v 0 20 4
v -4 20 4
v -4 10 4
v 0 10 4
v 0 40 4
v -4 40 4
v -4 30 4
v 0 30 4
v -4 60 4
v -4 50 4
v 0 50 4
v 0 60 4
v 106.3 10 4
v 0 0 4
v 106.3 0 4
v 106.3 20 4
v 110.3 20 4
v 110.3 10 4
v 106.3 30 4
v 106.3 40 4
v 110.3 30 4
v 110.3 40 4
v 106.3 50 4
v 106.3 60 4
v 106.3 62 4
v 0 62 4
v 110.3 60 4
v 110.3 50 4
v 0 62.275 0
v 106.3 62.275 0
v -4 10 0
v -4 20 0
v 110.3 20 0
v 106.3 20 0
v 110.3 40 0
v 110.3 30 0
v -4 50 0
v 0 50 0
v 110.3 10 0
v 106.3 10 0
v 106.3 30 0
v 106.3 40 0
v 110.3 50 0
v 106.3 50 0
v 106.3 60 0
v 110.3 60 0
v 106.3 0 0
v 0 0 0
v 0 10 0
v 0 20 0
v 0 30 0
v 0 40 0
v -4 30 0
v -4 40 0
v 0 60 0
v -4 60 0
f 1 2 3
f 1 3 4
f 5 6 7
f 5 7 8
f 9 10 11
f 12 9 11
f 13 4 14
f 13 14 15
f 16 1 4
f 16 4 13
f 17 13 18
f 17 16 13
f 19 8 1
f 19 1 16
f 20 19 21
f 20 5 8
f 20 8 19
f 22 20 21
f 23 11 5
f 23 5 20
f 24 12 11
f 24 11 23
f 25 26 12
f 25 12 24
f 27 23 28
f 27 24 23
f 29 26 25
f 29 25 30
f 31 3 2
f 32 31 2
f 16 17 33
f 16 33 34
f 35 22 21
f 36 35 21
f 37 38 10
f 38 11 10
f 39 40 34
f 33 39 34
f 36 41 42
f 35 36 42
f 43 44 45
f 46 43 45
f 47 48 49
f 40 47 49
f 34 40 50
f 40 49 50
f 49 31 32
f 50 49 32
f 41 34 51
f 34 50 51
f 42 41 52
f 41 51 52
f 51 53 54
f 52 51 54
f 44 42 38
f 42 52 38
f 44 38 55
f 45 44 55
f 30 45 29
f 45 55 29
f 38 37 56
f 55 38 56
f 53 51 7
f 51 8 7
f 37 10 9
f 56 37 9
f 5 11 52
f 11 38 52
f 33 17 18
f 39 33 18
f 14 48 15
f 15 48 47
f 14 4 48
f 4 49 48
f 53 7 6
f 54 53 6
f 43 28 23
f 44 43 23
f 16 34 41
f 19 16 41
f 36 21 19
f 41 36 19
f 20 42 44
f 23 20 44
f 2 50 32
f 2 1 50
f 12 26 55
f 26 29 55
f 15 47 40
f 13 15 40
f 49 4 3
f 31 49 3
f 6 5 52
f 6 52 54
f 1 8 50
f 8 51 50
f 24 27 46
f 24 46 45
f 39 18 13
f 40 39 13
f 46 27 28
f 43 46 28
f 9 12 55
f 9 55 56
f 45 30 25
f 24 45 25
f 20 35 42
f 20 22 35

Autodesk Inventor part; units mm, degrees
ref_plane "YZ Plane" through (0, 0, 0) normal (1, 0, 0) x (0, 1, 0)
ref_plane "XZ Plane" through (0, 0, 0) normal (0, 1, 0) x (-1, 0, 0)
ref_plane "XY Plane" through (0, 0, 0) normal (0, 0, 1) x (1, 0, 0)
sketch "Эскиз1" plane through (0, 0, 0) normal (0, 0, 1) x (1, 0, 0)
  line L0 (0, 0) -> (106.3, 0)
  line L1 (106.3, 0) -> (106.3, 62)
  line L2 (106.3, 62) -> (0, 62)
  line L3 (0, 62) -> (0, 0)
  dimension "d0" = 106.3
  dimension "d1" = 62
extrude "Выдавливание1" add sketch "Эскиз1" along normal blind 4
sketch "Эскиз2" plane through (0, 0, 4) normal (0, 0, 1) x (1, 0, 0)
  line L0 (106.3, 10) -> (106.3, 20) projected
  line L1 (110.3, 10) -> (106.3, 10) projected
  line L2 (110.3, 20) -> (110.3, 10) projected
  line L3 (110.3, 20) -> (106.3, 20) projected
  line L4 (106.3, 30) -> (106.3, 40) projected
  line L5 (110.3, 30) -> (106.3, 30) projected
  line L6 (110.3, 40) -> (110.3, 30) projected
  line L7 (110.3, 40) -> (106.3, 40) projected
  line L8 (106.3, 50) -> (106.3, 60) projected
  line L9 (110.3, 50) -> (106.3, 50) projected
  line L10 (110.3, 60) -> (110.3, 50) projected
  line L11 (110.3, 60) -> (106.3, 60) projected
  line L12 (-4, 10) -> (-4, 20) projected
  line L13 (0, 10) -> (-4, 10) projected
  line L14 (0, 20) -> (0, 10) projected
  line L15 (0, 20) -> (-4, 20) projected
  line L16 (-4, 30) -> (-4, 40) projected
  line L17 (0, 30) -> (-4, 30) projected
  line L18 (0, 40) -> (0, 30) projected
  line L19 (0, 40) -> (-4, 40) projected
  line L20 (-4, 50) -> (-4, 60) projected
  line L21 (0, 50) -> (-4, 50) projected
  line L22 (0, 60) -> (0, 50) projected
  line L23 (0, 60) -> (-4, 60) projected
  point P0 (0, 0)
extrude "Выдавливание2" add sketch "Эскиз2" against normal up to surface (4 mm away)
sketch "Эскиз3" plane through (-4, 50, 4) normal (-1, 0, 0) x (0, 0, 1)
  line L0 (-4, 10) -> (0, 10) projected
  line L1 (0, 10) -> (0, 16) projected
  line L2 (0, 16) -> (-10, 16.6879) projected
  line L3 (-10, 16.6879) -> (-10, 12.6879) projected
  line L4 (-10, 12.6879) -> (-20, 13.3759) projected
  line L5 (-20, 13.3759) -> (-20, 17.3759) projected
  line L6 (-20, 17.3759) -> (-30, 18.0638) projected
  line L7 (-30, 18.0638) -> (-30, 14.0638) projected
  line L8 (-30, 14.0638) -> (-40, 14.7517) projected
  line L9 (-40, 14.7517) -> (-40, 18.7517) projected
  line L10 (-40, 18.7517) -> (-50, 19.4397) projected
  line L11 (-50, 19.4397) -> (-50, 15.4397) projected
  line L12 (-50, 15.4397) -> (-60, 16.1276) projected
  line L13 (-60, 16.1276) -> (-60, 20.1276) projected
  line L14 (-60, 20.1276) -> (-70, 20.8155) projected
  line L15 (-70, 20.8155) -> (-70, 16.8155) projected
  line L16 (-70, 16.8155) -> (-80, 17.5035) projected
  line L17 (-80, 17.5035) -> (-80, 21.5035) projected
  line L18 (-80, 21.5035) -> (-90, 22.1914) projected
  line L19 (-90, 22.1914) -> (-90, 18.1914) projected
  line L20 (-90, 18.1914) -> (-100, 18.8794) projected
  line L21 (-100, 18.8794) -> (-100, 22.8794) projected
  line L22 (-100, 22.8794) -> (-110, 23.5673) projected
  line L23 (-110, 23.5673) -> (-110, 19.5673) projected
  line L24 (-110, 19.5673) -> (-120, 20.2552) projected
  line L25 (-120, 20.2552) -> (-120, 24.2552) projected
  line L26 (-120, 24.2552) -> (-130, 24.9432) projected
  line L27 (-130, 24.9432) -> (-130, 20.9432) projected
  line L28 (-130, 20.9432) -> (-140, 21.6311) projected
  line L29 (-140, 21.6311) -> (-140, 25.6311) projected
  line L30 (-140, 25.6311) -> (-145.3625, 26) projected
  line L31 (-145.3625, 26) -> (-145.3625, 16) projected
  line L32 (-145.3625, 16) -> (-208, -30) projected
  line L33 (-208, -50) -> (-208, -30) projected
  line L34 (-187, -50) -> (-208, -50) projected
  line L35 (-187, -54) -> (-187, -50) projected
  line L36 (-177, -54) -> (-187, -54) projected
  line L37 (-177, -50) -> (-177, -54) projected
  line L38 (-167, -50) -> (-177, -50) projected
  line L39 (-167, -54) -> (-167, -50) projected
  line L40 (-157, -54) -> (-167, -54) projected
  line L41 (-157, -50) -> (-157, -54) projected
  line L42 (-147, -50) -> (-157, -50) projected
  line L43 (-147, -54) -> (-147, -50) projected
  line L44 (-137, -54) -> (-147, -54) projected
  line L45 (-137, -50) -> (-137, -54) projected
  line L46 (-127, -50) -> (-137, -50) projected
  line L47 (-127, -54) -> (-127, -50) projected
  line L48 (-117, -54) -> (-127, -54) projected
  line L49 (-117, -50) -> (-117, -54) projected
  line L50 (-107, -50) -> (-117, -50) projected
  line L51 (-107, -54) -> (-107, -50) projected
  line L52 (-97, -54) -> (-107, -54) projected
  line L53 (-97, -50) -> (-97, -54) projected
  line L54 (-87, -50) -> (-97, -50) projected
  line L55 (-87, -54) -> (-87, -50) projected
  line L56 (-77, -54) -> (-87, -54) projected
  line L57 (-77, -50) -> (-77, -54) projected
  line L58 (-67, -50) -> (-77, -50) projected
  line L59 (-67, -54) -> (-67, -50) projected
  line L60 (-57, -54) -> (-67, -54) projected
  line L61 (-57, -50) -> (-57, -54) projected
  line L62 (-47, -50) -> (-57, -50) projected
  line L63 (-47, -54) -> (-47, -50) projected
  line L64 (-37, -54) -> (-47, -54) projected
  line L65 (-37, -50) -> (-37, -54) projected
  line L66 (-27, -50) -> (-37, -50) projected
  line L67 (-27, -54) -> (-27, -50) projected
  line L68 (-17, -54) -> (-27, -54) projected
  line L69 (-17, -50) -> (-17, -54) projected
  line L70 (-17, -50) -> (0, -50) projected
  line L71 (0, -50) -> (0, -40) projected
  line L72 (0, -40) -> (-4, -40) projected
  line L73 (-4, -40) -> (-4, -30) projected
  line L74 (-4, -30) -> (0, -30) projected
  line L75 (0, -30) -> (0, -20) projected
  line L76 (0, -20) -> (-4, -20) projected
  line L77 (-4, -20) -> (-4, -10) projected
  line L78 (-4, -10) -> (0, -10) projected
  line L79 (0, -10) -> (0, 0) projected
  line L80 (0, 0) -> (-4, 0) projected
  line L81 (-4, 0) -> (-4, 10) projected
  line L82 (-4, 12) -> (0, 12) projected
  line L83 (0, 12) -> (-10, 12.6879) projected
  line L84 (-4, 12) -> (-4, 13.5119)
  point P0 (-4, -50)
  point P1 (-4, 12.2752)
extrude "Выдавливание3" add sketch "Эскиз3" against normal up to surface (110.3 mm away) contours L82 L84 L83
sketch "Эскиз4" plane through (-4, 50, 4) normal (-1, 0, 0) x (0, 0, 1)
  line L0 (-4, 12) -> (0, 12) projected
  line L1 (0, 12) -> (-4, 12.2752) projected
  line L2 (-4, 12.2752) -> (-4, 12) projected
  point P0 (-4, -50)
extrude "Выдавливание4" cut sketch "Эскиз4" against normal up to surface (4 mm away)
properties part number "стульчак 4"
